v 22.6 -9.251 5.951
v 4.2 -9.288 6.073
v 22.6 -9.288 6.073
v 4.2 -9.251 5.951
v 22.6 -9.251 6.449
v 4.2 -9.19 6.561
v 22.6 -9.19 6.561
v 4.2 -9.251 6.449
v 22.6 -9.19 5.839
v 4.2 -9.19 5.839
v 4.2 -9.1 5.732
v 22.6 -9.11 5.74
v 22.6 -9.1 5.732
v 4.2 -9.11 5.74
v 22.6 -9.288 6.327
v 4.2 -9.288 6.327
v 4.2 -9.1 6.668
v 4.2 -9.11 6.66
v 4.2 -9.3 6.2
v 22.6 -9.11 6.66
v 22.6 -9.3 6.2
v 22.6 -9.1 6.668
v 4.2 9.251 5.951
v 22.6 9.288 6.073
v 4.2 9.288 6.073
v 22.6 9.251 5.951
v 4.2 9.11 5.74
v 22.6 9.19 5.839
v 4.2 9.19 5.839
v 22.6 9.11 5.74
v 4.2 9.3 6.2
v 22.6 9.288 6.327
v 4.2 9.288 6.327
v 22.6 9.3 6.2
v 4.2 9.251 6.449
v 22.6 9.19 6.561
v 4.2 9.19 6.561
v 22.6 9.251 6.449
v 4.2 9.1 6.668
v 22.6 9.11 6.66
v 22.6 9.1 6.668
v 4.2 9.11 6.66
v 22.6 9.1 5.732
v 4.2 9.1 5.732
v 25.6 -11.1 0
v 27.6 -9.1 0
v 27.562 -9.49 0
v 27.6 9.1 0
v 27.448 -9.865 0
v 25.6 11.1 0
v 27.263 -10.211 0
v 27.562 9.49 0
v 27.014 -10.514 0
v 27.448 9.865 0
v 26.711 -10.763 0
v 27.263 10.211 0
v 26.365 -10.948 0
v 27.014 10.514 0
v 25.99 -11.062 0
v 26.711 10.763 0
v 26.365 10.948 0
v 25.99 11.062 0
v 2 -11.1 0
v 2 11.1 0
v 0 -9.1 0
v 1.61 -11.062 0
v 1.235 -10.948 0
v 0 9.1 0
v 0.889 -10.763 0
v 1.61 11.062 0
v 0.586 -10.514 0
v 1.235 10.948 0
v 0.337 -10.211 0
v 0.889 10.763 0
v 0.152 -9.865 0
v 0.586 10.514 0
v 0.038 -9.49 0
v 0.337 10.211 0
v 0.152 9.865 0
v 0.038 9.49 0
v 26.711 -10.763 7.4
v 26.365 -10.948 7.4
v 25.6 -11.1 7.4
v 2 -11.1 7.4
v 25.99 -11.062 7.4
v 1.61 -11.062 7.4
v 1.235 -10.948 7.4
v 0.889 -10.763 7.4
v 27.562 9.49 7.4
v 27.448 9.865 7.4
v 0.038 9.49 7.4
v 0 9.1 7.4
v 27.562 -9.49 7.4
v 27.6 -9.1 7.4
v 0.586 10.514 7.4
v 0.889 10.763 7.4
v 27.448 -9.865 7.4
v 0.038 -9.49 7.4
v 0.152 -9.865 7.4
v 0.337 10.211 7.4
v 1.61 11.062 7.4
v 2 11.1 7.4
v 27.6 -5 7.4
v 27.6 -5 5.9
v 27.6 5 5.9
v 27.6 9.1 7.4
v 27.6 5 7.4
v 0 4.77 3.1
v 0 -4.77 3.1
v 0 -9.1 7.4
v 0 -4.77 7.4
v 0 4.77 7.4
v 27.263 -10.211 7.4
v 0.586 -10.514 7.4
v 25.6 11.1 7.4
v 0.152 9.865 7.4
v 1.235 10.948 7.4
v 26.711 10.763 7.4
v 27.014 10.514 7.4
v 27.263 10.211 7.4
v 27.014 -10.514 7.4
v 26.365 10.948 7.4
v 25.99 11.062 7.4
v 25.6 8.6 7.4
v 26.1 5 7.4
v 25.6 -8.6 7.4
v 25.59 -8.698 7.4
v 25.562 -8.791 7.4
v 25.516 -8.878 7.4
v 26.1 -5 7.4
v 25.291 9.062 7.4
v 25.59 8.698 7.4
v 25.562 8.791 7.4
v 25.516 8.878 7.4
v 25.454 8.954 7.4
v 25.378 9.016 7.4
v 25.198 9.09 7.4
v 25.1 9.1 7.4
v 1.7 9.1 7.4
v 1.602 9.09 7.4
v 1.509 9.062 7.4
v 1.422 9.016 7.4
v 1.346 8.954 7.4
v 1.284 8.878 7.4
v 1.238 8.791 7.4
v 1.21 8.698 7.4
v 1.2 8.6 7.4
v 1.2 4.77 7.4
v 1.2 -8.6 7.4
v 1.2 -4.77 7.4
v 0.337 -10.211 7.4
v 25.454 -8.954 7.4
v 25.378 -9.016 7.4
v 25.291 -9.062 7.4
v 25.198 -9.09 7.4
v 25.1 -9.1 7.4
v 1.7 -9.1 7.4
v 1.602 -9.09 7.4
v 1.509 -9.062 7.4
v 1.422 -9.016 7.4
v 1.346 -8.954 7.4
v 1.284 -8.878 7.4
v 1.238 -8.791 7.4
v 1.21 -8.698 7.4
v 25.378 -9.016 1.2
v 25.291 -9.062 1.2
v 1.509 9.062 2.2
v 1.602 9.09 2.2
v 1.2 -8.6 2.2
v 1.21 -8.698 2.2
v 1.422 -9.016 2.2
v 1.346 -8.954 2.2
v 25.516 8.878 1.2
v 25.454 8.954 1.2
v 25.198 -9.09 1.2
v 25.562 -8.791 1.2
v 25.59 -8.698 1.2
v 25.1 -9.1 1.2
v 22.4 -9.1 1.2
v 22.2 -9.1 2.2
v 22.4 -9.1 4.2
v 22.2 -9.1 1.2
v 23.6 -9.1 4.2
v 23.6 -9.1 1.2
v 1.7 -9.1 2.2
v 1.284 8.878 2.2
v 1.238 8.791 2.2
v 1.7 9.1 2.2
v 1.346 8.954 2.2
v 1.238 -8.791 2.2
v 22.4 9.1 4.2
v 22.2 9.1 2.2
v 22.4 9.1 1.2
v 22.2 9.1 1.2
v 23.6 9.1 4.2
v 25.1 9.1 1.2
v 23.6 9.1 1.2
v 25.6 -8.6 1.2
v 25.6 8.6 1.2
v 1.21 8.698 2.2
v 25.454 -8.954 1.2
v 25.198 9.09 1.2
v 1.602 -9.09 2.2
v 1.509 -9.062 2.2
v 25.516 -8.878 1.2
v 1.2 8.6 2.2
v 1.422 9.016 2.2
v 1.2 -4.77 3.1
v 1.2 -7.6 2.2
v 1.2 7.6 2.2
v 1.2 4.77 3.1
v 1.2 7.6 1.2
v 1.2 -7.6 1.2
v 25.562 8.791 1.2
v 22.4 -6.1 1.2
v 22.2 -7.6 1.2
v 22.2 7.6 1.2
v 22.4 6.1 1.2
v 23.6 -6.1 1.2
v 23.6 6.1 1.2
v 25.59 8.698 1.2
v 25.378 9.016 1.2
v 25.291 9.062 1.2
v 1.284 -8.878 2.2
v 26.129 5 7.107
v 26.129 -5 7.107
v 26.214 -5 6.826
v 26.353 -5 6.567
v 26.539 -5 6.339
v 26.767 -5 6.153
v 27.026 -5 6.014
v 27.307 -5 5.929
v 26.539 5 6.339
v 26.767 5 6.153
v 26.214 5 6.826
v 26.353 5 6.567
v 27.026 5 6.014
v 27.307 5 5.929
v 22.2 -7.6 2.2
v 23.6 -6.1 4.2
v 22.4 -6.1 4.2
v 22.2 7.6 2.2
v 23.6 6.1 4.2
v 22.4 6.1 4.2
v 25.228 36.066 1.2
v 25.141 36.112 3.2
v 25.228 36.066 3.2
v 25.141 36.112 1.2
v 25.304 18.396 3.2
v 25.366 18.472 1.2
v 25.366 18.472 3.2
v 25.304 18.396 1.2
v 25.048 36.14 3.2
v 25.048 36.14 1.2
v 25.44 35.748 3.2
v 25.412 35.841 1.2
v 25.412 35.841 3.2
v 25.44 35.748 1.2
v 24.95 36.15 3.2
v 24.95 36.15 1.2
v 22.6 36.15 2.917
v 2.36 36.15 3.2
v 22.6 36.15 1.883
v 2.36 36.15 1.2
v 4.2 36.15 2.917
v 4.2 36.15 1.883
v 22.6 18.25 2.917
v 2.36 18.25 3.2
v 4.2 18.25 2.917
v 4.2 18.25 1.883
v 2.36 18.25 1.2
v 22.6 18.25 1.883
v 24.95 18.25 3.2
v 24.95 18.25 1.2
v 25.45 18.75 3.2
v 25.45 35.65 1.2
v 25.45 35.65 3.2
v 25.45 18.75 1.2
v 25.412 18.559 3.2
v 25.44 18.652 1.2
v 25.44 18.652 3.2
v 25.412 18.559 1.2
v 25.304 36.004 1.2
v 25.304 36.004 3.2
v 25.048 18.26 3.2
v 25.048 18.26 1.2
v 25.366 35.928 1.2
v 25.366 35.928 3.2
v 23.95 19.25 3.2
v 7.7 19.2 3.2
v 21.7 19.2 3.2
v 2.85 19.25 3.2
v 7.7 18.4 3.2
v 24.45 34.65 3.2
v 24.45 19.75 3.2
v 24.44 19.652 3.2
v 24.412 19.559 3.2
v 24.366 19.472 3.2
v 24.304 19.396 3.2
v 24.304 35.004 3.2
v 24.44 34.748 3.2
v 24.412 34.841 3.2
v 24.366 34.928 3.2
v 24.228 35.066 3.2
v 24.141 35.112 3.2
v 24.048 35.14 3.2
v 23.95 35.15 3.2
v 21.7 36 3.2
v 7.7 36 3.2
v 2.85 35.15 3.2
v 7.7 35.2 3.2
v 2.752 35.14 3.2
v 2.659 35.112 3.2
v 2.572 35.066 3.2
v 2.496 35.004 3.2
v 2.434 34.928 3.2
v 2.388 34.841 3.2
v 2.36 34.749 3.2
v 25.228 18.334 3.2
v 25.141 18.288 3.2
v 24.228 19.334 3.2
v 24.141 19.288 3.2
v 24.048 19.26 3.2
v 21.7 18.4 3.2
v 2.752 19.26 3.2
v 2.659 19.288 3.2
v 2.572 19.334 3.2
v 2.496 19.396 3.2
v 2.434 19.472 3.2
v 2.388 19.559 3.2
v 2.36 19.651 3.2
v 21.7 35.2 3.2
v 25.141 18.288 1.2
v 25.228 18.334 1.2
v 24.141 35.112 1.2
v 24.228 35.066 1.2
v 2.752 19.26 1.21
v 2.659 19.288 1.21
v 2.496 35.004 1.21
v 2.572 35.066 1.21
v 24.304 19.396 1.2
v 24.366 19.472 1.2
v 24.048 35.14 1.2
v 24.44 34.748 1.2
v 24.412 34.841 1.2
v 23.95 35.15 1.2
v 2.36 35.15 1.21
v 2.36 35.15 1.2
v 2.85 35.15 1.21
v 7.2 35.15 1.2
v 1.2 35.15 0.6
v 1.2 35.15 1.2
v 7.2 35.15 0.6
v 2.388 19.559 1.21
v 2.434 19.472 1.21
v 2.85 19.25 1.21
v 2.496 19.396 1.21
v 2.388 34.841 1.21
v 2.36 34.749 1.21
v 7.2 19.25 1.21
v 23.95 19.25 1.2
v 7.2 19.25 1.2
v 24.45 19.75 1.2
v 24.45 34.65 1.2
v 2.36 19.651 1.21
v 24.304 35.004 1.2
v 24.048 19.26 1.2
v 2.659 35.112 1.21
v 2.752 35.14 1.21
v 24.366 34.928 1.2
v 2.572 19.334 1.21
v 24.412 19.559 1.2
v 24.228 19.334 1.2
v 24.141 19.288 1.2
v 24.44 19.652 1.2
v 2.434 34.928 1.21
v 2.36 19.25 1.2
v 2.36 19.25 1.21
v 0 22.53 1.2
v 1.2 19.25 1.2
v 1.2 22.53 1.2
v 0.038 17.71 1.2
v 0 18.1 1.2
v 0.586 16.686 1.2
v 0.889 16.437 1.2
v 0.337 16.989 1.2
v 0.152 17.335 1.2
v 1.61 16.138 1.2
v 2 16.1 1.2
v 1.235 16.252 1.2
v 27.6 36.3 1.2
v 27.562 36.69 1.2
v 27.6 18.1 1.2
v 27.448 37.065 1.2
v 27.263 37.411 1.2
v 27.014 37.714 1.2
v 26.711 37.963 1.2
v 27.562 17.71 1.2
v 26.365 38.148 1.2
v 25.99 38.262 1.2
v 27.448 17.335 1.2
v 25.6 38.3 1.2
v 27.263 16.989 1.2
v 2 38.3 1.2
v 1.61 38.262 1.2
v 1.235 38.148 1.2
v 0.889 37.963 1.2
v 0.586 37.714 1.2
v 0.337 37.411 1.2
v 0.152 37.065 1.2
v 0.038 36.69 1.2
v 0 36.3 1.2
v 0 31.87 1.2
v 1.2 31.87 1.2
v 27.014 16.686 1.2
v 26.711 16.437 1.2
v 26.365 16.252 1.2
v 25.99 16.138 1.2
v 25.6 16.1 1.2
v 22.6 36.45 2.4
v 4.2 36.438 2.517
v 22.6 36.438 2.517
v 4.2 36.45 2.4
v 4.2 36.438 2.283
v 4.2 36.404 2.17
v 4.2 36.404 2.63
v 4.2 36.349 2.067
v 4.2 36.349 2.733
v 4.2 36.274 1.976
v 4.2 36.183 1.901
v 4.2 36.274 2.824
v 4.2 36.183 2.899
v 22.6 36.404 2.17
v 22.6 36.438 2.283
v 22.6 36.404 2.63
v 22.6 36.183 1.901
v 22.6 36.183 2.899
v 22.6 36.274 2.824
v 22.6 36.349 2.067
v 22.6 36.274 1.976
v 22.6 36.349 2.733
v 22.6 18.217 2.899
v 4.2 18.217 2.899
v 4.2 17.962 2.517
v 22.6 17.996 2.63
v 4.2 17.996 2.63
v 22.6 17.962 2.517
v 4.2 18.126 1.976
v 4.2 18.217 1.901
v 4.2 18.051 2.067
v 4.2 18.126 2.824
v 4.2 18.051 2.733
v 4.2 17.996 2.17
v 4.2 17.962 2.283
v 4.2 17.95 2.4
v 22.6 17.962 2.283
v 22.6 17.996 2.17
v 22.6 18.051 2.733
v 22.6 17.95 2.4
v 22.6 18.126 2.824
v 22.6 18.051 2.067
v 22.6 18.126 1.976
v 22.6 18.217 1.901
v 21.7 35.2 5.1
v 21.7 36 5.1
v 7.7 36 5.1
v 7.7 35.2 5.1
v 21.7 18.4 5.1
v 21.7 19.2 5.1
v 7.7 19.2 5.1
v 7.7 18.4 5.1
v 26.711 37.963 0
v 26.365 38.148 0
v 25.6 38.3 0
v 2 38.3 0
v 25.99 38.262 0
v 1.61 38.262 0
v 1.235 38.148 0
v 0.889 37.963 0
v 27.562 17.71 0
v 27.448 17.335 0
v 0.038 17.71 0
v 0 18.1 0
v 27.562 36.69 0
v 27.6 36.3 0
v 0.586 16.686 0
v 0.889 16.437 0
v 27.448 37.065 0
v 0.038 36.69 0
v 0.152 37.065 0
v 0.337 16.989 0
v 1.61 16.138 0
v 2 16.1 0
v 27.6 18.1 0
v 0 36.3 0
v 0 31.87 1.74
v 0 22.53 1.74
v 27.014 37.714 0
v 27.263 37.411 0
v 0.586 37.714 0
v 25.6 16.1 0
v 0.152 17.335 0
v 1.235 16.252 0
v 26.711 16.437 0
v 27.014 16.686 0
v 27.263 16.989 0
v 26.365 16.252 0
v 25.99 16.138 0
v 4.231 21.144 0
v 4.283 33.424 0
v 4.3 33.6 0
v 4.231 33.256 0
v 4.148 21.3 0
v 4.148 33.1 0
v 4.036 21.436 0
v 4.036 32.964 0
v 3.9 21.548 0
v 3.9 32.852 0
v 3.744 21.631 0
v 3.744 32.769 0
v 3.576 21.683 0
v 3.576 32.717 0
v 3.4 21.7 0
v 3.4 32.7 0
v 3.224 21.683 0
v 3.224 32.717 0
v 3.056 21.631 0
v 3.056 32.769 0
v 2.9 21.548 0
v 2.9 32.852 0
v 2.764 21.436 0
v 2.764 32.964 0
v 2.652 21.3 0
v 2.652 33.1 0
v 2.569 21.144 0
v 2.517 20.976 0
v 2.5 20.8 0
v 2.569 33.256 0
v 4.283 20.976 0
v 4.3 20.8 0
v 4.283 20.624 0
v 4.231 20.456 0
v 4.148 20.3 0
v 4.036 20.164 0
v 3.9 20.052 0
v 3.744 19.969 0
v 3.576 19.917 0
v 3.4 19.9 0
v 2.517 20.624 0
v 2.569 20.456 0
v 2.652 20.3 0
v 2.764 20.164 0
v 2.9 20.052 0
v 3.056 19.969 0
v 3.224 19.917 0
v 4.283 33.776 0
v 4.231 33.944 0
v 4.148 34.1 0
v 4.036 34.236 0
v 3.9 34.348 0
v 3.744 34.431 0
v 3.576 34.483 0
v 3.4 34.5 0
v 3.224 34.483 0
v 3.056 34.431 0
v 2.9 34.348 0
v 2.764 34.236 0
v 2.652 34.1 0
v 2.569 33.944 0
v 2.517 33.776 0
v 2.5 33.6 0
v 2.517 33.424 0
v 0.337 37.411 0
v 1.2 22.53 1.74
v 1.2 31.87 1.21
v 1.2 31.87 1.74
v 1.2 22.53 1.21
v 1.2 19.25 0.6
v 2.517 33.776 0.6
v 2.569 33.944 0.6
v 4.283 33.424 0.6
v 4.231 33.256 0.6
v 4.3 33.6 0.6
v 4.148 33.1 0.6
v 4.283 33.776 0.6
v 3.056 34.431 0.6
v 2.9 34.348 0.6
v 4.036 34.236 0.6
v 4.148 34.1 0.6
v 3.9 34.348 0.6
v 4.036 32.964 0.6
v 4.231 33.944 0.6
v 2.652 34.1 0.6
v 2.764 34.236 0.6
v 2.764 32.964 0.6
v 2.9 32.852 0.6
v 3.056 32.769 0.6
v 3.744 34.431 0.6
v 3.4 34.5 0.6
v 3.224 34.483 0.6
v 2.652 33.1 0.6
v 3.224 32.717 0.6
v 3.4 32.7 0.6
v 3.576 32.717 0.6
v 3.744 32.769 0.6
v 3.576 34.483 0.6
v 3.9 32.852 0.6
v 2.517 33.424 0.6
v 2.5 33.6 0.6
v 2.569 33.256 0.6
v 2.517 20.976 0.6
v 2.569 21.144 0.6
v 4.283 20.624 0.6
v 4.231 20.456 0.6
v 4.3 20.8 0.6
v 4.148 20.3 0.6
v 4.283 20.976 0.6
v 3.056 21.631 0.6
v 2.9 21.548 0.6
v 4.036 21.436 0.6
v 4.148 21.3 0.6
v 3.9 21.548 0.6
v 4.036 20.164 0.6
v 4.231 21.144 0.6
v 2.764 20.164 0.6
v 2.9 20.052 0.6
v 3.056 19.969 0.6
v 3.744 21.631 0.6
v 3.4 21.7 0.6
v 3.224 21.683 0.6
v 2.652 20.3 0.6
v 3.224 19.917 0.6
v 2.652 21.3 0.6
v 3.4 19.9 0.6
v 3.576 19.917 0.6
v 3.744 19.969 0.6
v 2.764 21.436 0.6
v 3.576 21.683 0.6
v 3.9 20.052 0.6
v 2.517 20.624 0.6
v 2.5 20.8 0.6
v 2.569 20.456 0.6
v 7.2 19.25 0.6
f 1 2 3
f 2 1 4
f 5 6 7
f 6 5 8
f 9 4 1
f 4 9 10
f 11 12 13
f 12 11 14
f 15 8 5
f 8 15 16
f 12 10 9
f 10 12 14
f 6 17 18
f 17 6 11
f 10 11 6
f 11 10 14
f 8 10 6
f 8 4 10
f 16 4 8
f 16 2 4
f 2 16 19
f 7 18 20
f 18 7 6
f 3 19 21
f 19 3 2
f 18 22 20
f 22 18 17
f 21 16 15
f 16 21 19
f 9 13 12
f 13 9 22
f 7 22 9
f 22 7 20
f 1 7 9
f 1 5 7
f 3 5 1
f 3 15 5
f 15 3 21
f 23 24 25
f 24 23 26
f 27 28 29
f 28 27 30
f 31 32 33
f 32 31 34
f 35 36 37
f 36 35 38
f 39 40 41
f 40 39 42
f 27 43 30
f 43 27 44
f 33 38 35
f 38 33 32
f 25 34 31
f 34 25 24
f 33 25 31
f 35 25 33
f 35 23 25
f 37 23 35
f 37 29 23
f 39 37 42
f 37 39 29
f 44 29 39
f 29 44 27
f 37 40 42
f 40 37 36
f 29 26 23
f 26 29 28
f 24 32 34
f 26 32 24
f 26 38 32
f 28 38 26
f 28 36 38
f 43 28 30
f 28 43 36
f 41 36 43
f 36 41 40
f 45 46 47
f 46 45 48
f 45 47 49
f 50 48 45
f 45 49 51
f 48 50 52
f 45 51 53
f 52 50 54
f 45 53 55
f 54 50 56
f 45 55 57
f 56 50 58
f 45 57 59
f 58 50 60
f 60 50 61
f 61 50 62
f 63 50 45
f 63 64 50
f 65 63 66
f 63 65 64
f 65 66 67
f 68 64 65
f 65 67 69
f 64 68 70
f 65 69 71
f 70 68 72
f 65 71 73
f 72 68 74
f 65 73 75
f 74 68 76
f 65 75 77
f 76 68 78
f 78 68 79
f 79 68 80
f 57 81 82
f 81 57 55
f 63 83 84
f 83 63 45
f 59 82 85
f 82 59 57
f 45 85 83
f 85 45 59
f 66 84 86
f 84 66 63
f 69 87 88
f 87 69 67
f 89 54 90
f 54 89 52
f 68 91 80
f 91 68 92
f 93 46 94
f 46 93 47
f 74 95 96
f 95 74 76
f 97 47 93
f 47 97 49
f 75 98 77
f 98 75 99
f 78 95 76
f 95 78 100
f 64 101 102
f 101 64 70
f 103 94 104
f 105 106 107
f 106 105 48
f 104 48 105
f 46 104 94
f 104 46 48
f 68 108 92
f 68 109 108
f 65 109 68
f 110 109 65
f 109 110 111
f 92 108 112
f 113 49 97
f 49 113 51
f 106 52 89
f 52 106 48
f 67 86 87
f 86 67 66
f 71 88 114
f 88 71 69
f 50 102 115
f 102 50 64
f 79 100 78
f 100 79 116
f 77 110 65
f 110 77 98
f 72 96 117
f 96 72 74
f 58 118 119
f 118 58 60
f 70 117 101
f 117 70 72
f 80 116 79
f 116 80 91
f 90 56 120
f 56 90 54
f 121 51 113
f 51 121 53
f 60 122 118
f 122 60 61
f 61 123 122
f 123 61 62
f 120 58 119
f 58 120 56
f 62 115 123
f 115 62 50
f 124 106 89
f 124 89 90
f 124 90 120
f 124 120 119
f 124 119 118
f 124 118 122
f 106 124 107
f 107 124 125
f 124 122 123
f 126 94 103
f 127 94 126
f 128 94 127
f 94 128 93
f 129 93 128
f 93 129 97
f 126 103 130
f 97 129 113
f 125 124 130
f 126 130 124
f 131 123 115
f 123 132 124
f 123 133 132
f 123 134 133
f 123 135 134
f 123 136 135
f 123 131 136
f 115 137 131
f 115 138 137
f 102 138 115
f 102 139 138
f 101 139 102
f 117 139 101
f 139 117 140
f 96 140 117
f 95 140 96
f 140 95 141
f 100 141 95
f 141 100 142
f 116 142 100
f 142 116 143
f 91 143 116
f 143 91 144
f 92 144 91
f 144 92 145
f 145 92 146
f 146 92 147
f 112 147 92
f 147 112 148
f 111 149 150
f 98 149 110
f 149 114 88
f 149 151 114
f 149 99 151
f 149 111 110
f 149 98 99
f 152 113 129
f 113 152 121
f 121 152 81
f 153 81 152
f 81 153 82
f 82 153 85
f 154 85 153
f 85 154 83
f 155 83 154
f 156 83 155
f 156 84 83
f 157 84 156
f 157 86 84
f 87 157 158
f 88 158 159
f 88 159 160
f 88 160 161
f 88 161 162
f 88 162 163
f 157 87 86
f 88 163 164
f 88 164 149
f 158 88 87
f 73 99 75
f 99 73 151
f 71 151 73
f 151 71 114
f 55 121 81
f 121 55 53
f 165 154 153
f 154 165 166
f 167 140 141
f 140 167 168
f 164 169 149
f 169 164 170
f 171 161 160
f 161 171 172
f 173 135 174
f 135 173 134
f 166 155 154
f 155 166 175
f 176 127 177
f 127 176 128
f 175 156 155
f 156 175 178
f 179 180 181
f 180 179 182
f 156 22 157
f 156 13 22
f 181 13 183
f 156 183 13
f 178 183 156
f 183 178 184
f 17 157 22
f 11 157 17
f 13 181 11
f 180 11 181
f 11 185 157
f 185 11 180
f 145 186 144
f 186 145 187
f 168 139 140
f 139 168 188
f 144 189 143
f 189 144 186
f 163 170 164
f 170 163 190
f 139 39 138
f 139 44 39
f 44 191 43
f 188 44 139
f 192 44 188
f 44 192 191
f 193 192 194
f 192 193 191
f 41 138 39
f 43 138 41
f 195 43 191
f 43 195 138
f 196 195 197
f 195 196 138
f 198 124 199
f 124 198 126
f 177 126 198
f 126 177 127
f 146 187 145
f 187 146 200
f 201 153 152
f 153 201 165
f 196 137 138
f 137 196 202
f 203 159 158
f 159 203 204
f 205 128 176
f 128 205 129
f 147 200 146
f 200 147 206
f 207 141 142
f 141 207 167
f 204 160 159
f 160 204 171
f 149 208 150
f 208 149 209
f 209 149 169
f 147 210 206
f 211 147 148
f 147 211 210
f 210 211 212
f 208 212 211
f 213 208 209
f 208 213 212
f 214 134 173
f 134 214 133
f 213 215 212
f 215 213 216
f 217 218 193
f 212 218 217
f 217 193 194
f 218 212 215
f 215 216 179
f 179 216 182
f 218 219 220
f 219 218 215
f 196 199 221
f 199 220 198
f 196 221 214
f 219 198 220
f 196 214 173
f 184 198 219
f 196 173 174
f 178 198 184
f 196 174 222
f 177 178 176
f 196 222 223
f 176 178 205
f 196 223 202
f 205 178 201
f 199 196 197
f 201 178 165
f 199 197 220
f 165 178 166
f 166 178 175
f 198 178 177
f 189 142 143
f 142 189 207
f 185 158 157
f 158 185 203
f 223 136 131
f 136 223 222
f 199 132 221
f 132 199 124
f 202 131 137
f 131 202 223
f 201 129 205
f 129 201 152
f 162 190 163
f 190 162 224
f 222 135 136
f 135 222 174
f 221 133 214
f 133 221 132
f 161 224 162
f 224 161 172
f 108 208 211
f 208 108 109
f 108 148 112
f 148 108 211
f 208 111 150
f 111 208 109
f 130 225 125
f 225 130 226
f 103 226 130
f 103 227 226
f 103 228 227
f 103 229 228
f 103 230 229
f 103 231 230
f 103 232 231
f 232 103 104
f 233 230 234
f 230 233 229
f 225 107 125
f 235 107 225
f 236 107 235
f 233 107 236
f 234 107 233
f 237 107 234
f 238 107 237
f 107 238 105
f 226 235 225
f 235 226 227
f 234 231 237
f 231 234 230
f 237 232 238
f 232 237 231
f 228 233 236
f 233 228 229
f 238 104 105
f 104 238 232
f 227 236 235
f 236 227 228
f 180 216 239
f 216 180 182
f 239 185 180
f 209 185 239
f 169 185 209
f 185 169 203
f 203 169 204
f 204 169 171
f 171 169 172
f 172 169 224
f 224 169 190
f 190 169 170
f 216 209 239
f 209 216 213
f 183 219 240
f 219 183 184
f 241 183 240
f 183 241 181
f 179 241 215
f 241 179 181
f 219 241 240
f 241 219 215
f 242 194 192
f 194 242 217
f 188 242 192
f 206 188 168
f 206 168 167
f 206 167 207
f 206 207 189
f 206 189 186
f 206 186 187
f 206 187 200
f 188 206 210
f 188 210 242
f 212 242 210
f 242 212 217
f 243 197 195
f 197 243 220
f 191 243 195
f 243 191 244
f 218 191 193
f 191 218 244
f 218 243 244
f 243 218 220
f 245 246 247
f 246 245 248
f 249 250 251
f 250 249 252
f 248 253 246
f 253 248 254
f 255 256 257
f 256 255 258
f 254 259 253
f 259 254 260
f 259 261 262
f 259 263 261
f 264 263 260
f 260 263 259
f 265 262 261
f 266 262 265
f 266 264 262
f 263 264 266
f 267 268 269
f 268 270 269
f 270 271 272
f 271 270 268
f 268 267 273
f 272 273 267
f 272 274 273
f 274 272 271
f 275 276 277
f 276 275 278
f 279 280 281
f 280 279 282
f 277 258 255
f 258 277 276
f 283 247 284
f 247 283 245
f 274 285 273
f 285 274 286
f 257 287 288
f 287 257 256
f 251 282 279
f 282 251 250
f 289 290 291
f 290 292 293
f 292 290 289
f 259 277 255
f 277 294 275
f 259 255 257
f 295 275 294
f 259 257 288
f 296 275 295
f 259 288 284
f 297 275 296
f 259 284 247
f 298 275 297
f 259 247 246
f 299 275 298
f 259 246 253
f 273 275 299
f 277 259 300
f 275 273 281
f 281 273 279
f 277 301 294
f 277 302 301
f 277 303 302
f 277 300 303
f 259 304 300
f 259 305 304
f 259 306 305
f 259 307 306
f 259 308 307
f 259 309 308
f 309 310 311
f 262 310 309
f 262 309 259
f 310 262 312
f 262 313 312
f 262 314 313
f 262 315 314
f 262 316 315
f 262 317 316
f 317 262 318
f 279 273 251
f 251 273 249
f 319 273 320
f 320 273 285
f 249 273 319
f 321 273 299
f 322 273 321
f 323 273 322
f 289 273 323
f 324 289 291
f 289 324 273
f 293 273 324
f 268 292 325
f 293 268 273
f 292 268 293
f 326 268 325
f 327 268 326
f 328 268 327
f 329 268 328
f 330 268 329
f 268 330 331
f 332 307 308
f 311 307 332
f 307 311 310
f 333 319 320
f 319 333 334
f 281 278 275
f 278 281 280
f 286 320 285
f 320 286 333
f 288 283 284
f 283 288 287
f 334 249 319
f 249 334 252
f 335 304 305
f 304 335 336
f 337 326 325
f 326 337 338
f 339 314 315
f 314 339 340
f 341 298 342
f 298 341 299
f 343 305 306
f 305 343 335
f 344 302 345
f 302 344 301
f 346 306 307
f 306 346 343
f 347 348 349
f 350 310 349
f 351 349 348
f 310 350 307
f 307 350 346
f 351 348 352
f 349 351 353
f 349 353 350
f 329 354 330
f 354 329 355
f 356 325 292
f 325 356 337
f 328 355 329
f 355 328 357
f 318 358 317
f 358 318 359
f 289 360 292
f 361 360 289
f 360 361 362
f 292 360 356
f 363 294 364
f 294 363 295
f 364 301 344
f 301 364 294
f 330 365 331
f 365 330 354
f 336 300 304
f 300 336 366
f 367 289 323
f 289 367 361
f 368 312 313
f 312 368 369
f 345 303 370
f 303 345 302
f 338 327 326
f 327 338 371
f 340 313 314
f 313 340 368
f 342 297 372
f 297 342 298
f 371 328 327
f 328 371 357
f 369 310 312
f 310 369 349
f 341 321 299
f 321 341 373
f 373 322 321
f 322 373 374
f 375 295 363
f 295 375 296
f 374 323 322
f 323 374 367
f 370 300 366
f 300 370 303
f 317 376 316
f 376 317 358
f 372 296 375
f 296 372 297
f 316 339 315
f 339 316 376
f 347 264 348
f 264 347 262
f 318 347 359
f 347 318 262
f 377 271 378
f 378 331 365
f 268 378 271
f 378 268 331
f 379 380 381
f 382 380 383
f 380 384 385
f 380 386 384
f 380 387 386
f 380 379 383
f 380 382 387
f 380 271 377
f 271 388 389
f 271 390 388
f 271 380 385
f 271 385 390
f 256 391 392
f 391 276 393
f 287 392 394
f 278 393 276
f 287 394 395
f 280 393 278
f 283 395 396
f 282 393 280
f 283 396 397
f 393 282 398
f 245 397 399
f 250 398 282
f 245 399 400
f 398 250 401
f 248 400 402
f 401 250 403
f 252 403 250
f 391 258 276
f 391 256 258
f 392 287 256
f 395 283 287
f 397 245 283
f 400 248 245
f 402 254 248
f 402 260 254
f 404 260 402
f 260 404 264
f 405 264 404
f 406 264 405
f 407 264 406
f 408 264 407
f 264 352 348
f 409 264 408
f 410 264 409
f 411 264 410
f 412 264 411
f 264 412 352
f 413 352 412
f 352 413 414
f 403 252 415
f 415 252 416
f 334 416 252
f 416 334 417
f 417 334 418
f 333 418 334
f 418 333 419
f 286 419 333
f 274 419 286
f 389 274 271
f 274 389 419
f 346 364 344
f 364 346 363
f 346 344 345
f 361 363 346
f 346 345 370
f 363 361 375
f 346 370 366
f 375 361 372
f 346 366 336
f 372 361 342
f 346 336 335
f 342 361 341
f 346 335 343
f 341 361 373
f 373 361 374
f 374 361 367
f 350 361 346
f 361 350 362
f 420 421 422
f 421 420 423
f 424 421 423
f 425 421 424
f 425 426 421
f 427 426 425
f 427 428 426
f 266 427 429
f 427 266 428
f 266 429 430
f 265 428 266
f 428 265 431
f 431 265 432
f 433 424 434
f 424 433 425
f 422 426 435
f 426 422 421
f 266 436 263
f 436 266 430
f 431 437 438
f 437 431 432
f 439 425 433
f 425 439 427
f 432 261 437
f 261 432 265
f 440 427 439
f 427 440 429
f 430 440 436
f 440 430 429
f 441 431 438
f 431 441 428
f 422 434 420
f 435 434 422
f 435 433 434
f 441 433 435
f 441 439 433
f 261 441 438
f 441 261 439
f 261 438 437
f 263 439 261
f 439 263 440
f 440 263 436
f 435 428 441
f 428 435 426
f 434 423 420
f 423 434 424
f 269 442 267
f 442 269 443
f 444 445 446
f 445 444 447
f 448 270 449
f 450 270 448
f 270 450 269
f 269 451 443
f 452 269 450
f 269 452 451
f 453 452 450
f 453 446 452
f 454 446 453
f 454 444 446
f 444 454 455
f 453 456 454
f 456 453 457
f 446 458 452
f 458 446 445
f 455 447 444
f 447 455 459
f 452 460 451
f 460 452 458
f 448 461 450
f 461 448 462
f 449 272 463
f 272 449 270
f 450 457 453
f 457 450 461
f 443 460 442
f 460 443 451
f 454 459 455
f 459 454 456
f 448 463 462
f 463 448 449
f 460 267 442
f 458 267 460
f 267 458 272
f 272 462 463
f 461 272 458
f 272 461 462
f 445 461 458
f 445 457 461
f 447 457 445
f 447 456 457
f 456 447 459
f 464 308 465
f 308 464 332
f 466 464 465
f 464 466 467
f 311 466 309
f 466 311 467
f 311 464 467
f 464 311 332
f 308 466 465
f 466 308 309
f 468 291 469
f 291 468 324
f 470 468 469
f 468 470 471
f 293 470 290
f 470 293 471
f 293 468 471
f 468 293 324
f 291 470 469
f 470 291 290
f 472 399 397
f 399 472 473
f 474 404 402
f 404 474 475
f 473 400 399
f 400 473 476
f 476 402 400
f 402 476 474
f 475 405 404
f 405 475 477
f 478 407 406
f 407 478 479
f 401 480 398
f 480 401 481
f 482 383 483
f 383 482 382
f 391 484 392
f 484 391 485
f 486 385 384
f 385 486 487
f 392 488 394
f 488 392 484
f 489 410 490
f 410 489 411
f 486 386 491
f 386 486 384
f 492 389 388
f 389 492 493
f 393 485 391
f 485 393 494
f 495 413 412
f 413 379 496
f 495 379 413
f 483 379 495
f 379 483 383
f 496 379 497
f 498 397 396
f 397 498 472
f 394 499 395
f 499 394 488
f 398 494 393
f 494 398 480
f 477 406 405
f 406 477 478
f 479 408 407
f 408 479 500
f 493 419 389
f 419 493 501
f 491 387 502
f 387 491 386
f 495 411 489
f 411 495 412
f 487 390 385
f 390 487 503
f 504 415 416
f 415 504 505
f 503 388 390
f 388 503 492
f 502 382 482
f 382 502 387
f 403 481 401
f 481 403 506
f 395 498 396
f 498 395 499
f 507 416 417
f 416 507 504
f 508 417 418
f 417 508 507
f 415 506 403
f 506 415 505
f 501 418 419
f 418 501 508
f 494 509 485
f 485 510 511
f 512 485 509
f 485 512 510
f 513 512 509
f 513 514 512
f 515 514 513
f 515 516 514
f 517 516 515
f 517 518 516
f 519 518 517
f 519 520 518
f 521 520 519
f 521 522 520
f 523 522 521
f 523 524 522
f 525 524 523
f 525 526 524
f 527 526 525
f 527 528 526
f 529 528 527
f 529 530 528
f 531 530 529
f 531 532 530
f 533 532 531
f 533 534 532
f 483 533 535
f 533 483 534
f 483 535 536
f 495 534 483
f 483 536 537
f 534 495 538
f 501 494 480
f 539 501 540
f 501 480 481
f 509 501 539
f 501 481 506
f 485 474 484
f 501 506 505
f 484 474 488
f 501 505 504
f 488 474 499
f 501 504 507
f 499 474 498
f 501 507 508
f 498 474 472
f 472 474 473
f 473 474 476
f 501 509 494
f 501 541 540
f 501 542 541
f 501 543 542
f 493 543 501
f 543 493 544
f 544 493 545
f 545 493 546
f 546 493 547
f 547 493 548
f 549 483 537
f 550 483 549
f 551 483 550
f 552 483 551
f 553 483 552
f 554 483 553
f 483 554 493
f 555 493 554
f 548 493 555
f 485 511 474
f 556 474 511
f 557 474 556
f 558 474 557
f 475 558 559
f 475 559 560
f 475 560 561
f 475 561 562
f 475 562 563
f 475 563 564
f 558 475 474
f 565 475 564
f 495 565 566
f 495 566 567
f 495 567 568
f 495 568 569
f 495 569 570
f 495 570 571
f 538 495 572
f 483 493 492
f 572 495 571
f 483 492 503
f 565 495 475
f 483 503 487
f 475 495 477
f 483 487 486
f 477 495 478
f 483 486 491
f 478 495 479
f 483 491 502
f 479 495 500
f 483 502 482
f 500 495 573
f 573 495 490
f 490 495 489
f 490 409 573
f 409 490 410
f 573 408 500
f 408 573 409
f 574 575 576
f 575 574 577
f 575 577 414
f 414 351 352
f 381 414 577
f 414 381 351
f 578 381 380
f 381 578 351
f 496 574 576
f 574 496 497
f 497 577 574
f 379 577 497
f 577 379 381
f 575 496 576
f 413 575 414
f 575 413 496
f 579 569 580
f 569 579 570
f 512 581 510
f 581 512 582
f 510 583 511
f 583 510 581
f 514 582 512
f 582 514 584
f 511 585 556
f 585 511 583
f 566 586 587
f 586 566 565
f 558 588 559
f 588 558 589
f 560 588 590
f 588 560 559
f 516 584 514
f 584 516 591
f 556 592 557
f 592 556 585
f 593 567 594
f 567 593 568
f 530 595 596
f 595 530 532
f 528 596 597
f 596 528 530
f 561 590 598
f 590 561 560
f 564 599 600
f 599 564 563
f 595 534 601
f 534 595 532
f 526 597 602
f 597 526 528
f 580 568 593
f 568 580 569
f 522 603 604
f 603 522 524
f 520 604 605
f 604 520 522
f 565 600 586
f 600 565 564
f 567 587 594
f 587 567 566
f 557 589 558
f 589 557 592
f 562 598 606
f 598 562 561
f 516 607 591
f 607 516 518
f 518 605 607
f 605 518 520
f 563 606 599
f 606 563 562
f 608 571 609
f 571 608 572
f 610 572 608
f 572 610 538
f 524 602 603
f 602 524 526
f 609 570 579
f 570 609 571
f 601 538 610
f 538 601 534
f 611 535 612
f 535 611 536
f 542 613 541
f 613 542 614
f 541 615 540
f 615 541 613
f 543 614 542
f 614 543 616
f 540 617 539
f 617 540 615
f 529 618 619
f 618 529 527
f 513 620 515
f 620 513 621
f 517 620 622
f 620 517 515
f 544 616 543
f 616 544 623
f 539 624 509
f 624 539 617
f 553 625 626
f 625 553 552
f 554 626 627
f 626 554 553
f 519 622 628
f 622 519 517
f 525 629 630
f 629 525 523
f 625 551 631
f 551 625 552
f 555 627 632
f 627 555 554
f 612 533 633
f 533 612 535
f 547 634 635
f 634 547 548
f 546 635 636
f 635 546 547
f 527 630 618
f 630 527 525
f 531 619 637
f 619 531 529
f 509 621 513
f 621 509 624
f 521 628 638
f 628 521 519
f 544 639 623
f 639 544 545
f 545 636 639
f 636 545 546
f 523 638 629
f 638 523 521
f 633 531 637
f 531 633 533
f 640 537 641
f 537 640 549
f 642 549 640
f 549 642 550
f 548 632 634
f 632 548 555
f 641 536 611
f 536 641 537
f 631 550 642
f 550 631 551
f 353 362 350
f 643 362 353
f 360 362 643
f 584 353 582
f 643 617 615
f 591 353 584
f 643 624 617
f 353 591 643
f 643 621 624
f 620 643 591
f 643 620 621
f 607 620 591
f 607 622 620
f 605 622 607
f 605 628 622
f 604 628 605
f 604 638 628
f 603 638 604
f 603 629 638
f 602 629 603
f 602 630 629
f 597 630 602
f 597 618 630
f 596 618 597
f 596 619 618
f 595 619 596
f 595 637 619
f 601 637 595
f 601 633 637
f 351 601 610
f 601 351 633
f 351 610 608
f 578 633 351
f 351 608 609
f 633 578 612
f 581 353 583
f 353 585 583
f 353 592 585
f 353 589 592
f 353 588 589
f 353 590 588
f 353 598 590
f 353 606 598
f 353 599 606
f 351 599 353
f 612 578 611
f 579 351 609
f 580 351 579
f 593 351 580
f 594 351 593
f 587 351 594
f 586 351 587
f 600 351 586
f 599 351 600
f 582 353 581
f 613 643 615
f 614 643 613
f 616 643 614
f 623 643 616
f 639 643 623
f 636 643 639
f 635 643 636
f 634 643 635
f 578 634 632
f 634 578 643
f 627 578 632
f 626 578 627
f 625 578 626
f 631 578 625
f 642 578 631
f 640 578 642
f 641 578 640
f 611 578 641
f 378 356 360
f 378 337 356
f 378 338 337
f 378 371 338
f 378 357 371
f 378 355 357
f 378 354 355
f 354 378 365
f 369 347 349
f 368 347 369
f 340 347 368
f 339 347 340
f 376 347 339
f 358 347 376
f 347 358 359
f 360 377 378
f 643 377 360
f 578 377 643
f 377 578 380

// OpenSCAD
// SPDX-License-Identifier: AGPL-3.0-or-later
// Board-only "snap" version of the XIAO ESP32S3 case: no room for the antenna inside.
// Same geometry and parameters as xiao-esp32s3-case.scad: edit them there, all versions stay in step.

include <xiao-esp32s3-case.scad>
style = "snap";
antenna = false;
